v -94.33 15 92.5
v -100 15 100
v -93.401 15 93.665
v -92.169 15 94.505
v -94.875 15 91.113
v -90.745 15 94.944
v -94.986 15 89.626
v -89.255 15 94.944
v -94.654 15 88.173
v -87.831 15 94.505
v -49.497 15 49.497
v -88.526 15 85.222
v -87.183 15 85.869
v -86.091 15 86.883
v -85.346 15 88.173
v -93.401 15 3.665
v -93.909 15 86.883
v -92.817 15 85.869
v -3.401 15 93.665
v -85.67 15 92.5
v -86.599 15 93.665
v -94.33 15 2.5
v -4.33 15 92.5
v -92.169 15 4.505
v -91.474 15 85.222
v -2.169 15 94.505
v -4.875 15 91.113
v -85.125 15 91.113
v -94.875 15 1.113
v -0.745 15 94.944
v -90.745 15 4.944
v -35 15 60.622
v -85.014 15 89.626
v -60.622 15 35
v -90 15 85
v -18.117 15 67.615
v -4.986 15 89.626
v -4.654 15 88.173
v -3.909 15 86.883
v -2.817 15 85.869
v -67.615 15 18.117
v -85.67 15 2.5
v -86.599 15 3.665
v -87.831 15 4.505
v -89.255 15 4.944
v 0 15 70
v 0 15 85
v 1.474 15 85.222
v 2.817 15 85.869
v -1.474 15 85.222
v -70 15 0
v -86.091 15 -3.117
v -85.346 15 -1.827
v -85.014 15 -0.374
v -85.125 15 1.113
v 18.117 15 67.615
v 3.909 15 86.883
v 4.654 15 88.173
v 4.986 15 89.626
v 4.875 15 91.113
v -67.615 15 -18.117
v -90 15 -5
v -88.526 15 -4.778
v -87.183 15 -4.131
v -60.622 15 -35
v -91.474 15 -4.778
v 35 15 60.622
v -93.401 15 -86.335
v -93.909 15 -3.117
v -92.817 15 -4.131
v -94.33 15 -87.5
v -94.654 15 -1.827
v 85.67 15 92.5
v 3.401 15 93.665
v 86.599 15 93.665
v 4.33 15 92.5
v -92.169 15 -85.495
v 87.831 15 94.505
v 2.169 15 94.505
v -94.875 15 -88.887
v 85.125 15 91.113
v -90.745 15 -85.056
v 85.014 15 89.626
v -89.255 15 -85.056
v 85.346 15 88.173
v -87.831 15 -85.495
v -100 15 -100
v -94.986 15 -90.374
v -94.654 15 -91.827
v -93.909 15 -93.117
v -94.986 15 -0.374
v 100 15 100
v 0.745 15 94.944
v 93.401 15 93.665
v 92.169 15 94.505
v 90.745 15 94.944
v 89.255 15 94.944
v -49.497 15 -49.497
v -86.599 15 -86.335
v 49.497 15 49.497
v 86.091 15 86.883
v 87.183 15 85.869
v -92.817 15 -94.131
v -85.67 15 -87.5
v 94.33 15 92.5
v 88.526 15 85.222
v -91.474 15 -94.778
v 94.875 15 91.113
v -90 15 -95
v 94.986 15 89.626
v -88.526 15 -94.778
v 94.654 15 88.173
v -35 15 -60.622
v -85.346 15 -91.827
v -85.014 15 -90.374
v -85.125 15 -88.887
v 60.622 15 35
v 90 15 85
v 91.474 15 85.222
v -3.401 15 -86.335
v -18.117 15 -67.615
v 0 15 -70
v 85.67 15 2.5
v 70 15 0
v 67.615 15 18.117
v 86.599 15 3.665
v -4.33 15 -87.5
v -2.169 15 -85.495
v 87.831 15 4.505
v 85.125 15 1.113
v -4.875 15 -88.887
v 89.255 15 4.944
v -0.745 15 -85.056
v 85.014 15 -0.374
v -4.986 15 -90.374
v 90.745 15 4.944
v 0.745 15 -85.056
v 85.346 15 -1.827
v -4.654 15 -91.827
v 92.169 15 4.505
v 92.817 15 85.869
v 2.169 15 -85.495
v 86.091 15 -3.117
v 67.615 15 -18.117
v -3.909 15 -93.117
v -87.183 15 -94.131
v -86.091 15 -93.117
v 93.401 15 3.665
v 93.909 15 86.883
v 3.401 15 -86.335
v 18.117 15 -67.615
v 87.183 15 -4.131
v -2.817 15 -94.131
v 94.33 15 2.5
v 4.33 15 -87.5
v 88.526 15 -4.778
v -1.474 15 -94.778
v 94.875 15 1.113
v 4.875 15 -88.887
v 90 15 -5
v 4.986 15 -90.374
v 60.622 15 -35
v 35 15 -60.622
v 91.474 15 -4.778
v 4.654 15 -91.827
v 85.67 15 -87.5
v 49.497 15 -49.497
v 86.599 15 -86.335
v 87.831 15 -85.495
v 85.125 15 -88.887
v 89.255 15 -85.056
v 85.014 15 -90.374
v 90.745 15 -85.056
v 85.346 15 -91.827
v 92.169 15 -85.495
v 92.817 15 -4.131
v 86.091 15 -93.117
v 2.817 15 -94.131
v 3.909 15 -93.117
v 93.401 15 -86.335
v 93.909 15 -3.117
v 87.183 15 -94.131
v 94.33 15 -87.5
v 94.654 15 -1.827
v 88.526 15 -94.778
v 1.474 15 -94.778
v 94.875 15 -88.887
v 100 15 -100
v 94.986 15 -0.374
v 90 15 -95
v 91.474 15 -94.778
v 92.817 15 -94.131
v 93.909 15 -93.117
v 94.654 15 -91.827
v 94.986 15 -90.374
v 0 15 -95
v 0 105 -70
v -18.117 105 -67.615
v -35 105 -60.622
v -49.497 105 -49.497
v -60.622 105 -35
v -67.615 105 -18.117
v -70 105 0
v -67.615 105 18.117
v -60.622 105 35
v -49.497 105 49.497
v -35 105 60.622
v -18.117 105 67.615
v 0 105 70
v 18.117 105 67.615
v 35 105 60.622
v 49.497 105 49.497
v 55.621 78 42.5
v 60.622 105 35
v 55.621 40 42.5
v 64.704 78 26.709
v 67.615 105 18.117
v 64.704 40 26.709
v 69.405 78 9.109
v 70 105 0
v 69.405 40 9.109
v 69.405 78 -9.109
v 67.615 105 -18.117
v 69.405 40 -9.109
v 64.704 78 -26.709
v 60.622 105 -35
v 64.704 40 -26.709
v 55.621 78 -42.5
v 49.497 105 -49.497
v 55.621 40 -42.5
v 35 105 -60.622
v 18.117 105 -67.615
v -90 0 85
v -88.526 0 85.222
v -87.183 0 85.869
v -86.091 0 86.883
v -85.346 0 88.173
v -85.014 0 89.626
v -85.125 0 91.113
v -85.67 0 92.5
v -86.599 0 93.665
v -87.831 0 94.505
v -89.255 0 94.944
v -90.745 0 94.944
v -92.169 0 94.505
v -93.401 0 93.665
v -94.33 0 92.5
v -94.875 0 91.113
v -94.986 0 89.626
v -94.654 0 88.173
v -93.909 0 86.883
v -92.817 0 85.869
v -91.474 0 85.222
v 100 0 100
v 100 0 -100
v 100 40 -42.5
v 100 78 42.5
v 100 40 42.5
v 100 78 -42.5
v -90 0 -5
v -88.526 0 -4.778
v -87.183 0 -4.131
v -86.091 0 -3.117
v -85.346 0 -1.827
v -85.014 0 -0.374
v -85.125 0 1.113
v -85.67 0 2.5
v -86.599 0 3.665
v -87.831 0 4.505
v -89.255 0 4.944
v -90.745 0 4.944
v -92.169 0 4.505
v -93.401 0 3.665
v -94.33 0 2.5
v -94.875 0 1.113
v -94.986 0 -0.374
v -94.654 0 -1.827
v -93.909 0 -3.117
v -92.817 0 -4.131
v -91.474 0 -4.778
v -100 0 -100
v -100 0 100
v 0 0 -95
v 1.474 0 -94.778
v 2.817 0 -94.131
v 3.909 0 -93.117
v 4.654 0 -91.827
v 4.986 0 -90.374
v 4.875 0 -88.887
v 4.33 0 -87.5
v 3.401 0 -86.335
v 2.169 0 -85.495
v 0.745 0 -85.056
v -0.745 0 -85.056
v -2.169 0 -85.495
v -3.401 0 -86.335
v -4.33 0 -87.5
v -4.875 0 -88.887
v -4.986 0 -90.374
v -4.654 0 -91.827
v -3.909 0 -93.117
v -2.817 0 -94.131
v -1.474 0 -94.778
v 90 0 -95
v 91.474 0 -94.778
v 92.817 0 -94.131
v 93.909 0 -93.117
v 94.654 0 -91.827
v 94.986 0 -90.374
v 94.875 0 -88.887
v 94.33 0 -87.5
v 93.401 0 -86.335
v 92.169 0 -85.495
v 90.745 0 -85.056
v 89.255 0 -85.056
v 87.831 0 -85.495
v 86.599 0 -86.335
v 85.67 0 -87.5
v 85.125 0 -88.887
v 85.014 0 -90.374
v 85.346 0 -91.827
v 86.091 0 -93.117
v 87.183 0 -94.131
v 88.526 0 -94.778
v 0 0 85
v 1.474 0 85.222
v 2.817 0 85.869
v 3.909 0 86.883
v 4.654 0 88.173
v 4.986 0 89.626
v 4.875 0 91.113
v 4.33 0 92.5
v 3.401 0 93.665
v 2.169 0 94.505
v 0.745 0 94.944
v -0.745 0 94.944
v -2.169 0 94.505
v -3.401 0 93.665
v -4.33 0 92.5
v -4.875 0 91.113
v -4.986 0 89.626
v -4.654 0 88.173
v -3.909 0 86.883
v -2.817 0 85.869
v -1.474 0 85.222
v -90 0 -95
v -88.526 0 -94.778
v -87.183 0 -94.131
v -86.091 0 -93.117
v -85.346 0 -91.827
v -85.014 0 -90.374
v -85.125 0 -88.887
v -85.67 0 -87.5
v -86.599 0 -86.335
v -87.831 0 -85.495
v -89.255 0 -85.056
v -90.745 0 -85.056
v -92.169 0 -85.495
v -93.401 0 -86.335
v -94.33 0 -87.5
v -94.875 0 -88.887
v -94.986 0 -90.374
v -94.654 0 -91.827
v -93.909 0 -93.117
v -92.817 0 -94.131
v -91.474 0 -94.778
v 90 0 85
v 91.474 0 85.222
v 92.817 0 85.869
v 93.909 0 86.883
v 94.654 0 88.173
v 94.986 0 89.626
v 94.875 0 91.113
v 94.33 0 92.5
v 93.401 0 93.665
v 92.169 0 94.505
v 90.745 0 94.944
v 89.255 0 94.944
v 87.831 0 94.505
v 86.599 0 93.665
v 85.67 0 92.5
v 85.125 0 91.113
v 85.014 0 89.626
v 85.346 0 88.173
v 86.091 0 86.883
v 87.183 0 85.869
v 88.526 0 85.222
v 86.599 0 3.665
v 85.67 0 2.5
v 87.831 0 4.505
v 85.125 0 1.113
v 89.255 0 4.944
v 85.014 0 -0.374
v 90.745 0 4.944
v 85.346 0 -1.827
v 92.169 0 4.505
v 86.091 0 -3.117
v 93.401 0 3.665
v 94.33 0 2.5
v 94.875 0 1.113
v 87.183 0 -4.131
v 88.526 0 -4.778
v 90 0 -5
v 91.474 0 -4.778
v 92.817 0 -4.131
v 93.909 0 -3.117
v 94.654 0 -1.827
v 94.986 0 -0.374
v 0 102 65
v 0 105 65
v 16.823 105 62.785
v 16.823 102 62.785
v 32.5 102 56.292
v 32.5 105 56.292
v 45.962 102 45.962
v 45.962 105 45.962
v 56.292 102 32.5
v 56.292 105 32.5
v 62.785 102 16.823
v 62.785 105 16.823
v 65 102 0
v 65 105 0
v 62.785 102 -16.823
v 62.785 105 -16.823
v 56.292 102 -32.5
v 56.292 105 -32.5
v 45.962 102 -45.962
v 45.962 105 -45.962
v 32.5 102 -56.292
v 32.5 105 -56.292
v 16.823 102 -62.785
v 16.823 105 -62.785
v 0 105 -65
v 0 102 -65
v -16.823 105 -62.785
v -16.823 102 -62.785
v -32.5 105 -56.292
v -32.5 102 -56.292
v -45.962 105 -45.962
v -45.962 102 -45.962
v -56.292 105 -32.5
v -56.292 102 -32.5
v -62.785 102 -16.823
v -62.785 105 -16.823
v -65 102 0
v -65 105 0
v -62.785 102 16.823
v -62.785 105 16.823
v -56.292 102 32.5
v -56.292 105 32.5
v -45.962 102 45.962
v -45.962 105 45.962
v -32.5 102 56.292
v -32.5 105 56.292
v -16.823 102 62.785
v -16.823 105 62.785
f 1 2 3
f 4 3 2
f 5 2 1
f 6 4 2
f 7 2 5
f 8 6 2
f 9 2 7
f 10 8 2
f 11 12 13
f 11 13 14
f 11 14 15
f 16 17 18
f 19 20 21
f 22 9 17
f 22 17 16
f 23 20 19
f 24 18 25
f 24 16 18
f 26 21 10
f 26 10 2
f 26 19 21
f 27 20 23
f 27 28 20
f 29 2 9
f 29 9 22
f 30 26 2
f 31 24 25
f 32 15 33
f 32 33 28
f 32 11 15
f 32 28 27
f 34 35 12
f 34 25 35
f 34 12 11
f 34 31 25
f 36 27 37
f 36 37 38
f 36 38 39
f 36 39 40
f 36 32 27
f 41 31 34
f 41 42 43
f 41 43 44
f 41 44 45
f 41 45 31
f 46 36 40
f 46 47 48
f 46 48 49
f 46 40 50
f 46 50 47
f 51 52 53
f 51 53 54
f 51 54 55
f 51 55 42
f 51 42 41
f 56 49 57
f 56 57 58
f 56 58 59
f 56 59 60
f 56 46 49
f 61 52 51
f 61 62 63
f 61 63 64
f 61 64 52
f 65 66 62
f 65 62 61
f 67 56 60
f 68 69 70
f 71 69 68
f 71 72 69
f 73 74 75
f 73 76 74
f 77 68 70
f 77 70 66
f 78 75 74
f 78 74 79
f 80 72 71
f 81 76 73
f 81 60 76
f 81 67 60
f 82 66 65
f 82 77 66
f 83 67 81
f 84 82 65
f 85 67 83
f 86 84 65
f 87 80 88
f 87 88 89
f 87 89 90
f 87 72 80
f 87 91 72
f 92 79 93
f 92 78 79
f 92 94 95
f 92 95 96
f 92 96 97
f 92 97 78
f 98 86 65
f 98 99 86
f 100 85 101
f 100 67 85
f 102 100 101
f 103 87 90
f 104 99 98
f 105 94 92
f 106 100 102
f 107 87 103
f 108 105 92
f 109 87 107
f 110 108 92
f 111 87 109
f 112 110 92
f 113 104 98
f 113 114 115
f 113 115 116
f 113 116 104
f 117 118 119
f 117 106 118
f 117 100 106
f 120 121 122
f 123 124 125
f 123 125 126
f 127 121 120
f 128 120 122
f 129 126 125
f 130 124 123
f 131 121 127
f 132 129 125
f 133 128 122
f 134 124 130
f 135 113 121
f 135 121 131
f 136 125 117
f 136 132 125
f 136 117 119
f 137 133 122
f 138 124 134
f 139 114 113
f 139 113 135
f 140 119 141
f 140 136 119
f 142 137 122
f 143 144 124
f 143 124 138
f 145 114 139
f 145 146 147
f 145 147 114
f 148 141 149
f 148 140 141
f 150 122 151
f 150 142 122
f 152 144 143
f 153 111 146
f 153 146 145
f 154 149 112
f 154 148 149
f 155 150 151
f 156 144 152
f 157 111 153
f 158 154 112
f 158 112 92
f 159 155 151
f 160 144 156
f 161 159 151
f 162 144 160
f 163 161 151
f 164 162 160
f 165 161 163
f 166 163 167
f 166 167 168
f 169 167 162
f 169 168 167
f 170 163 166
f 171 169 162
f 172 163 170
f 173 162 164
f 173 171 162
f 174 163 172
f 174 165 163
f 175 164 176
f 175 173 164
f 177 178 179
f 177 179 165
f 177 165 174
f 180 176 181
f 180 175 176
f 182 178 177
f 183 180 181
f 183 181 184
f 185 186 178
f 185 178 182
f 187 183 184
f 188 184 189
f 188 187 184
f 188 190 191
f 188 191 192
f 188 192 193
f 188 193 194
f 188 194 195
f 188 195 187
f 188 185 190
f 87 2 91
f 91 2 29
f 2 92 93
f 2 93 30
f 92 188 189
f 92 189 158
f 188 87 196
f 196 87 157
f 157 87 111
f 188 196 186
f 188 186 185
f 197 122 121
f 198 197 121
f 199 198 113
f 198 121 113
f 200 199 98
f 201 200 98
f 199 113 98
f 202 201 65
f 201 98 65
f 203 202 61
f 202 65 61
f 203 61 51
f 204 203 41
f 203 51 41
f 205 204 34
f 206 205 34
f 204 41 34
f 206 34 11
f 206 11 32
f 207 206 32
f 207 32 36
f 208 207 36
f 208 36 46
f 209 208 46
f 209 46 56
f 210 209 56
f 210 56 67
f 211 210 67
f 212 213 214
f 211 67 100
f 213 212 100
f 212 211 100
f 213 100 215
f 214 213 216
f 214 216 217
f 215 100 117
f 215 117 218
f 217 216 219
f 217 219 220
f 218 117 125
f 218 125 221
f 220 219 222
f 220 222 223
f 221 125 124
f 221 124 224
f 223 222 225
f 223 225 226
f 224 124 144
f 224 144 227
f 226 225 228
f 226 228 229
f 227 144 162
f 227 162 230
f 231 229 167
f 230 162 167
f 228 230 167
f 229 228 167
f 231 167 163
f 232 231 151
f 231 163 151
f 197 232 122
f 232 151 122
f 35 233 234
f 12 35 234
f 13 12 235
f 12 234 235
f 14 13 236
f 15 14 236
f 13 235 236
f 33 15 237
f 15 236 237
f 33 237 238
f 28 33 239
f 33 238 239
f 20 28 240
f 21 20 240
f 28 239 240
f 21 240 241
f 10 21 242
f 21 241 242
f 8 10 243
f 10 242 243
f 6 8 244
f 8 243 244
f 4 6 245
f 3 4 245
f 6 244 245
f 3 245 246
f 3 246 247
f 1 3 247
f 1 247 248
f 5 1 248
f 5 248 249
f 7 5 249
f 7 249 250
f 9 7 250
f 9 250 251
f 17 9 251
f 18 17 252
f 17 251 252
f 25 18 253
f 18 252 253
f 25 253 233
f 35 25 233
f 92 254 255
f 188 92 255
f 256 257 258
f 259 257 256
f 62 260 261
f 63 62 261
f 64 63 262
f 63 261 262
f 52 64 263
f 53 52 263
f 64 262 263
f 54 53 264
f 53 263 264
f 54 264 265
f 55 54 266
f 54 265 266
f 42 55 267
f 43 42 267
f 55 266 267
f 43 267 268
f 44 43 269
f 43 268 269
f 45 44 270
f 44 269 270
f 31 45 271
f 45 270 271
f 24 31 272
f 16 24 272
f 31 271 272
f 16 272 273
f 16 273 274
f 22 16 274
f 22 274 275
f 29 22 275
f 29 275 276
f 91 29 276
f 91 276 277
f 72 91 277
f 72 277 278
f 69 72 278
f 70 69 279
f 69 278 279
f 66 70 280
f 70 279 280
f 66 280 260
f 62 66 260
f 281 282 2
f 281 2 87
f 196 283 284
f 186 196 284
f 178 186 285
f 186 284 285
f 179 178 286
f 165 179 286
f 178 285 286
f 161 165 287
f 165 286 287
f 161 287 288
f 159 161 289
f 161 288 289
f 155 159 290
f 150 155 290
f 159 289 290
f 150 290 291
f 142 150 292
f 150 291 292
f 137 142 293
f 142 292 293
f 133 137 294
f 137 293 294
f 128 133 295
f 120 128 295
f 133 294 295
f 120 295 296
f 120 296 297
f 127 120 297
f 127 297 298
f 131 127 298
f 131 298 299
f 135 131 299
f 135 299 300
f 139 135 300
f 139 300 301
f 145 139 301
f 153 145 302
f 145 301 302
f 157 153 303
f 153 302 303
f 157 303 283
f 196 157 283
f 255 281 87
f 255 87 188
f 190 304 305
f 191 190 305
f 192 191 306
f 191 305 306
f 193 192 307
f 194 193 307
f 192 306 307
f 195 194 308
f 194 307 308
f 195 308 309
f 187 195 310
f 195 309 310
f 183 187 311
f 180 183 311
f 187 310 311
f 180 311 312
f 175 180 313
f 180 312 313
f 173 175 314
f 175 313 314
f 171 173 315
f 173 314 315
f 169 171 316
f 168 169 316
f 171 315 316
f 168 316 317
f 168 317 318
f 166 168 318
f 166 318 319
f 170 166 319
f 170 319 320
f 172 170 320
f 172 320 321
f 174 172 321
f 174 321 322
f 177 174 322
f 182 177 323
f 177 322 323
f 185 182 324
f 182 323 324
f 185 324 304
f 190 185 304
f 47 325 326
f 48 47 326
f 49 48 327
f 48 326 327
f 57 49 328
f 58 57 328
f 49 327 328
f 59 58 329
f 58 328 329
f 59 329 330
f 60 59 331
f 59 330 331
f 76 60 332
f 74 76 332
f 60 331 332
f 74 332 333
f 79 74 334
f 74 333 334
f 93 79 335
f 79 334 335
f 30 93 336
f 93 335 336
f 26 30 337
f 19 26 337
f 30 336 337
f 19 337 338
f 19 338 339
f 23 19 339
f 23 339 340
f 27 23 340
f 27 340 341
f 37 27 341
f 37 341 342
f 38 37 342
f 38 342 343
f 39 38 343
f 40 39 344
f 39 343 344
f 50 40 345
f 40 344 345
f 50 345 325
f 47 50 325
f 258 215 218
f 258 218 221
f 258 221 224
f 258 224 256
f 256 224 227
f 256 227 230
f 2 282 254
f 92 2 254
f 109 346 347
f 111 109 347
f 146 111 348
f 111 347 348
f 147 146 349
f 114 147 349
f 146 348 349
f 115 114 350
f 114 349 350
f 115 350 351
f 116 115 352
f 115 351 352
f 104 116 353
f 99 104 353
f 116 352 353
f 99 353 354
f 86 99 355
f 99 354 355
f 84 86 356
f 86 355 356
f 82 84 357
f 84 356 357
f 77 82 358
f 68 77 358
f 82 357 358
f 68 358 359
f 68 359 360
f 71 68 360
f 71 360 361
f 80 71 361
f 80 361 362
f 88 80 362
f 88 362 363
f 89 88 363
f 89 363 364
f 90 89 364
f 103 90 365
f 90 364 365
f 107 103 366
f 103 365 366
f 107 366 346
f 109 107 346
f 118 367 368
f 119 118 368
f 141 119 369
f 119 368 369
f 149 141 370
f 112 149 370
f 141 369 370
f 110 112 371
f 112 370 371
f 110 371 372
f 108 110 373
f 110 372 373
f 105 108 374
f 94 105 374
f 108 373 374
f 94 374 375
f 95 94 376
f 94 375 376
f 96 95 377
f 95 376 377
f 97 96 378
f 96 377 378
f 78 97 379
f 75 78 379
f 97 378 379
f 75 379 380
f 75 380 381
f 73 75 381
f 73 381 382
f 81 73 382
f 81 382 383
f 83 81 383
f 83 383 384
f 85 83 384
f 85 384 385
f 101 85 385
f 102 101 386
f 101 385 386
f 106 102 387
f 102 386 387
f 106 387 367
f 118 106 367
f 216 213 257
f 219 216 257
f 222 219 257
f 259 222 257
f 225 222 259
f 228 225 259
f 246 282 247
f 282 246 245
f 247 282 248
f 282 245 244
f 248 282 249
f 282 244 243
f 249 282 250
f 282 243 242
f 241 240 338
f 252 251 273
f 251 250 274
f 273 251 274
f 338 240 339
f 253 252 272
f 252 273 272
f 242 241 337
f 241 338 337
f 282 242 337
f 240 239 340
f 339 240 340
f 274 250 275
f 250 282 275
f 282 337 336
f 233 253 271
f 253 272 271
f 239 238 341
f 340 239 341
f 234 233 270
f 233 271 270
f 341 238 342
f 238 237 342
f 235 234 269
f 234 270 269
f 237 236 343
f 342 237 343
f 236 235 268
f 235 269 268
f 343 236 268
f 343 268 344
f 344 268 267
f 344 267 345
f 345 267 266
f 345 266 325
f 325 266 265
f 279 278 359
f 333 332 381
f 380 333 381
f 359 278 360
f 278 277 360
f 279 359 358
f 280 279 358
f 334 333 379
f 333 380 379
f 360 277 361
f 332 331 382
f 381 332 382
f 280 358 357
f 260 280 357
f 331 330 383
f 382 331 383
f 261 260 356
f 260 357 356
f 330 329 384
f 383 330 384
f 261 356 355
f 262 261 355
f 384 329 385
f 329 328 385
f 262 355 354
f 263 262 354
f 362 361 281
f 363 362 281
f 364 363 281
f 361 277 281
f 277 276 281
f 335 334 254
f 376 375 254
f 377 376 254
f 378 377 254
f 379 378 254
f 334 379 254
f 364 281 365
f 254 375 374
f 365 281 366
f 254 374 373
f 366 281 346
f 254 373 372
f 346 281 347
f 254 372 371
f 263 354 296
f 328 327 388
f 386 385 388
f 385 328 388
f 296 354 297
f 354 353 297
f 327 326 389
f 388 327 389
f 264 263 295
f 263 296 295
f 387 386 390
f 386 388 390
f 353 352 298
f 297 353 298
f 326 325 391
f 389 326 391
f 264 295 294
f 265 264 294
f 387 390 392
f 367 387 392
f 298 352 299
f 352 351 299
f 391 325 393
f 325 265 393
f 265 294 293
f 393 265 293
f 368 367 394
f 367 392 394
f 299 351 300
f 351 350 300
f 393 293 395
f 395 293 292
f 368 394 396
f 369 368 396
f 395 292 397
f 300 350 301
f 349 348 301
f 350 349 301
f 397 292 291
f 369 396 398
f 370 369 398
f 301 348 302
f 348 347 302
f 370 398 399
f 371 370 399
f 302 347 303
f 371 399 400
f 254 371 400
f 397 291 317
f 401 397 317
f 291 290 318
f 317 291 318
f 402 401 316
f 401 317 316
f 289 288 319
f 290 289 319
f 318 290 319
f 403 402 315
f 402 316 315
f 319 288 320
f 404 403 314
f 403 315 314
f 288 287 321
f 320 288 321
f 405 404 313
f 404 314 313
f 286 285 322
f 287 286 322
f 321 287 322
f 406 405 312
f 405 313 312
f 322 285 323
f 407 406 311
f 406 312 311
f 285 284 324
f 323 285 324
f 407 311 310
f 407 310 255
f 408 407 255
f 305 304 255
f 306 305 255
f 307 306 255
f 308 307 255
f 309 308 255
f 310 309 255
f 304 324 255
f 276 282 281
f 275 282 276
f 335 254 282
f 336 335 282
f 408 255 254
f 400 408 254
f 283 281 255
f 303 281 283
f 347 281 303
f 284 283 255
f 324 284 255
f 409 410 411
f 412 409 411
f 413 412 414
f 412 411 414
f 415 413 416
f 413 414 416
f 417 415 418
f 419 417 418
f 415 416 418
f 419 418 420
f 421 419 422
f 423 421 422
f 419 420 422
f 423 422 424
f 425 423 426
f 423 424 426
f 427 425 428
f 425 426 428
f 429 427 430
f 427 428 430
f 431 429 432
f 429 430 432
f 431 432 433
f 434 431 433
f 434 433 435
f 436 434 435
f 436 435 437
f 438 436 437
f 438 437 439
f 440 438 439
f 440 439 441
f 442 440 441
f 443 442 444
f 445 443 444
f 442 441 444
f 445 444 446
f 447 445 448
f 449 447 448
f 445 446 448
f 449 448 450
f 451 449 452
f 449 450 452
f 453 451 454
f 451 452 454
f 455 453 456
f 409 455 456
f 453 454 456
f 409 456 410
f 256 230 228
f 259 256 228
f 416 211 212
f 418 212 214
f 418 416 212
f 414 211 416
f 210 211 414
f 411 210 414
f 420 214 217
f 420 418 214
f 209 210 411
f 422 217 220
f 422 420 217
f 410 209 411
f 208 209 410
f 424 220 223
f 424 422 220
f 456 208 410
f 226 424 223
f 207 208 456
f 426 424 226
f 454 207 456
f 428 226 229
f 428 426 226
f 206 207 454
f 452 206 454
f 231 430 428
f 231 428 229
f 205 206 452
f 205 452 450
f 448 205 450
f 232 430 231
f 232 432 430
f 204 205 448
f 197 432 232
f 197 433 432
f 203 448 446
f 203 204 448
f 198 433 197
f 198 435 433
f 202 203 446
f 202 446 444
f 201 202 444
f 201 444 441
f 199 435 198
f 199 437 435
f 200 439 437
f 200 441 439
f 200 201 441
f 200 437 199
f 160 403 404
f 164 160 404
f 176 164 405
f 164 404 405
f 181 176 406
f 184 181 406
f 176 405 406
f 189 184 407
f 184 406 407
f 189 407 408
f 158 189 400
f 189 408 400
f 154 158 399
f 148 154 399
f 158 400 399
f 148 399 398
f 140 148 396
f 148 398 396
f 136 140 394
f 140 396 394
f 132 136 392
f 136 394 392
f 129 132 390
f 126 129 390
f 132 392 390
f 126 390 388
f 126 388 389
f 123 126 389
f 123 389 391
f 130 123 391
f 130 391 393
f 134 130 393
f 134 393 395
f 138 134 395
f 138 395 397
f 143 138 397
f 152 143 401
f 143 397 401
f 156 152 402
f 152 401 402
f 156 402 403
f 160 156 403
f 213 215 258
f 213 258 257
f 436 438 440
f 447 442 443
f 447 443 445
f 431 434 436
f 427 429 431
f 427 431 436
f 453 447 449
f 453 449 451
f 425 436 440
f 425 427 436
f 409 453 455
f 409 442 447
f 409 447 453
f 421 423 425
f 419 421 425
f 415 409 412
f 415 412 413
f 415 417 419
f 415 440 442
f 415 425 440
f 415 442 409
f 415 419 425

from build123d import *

# Parameters (mm, degrees)
SKETCH1_W           = 200
SKETCH1_H           = 200
BOSS_EXTRUDE1_DEPTH = 15
SKETCH2_R           = 70
BOSS_EXTRUDE2_DEPTH = 90
SKETCH4_R           = 65
CUT_EXTRUDE1_DEPTH  = 3
SKETCH5_W           = 85
SKETCH5_H           = 38
BOSS_EXTRUDE3_DEPTH = 100
SKETCH6_R           = 5
CUT_EXTRUDE2_DEPTH  = 15


with BuildPart() as part:
    # Sketch1 → Boss-Extrude1 (new body)
    with BuildSketch(Plane(origin=(0, 0, 0), x_dir=(1, 0, 0), z_dir=(0, 1, 0))):
        Rectangle(SKETCH1_W, SKETCH1_H)
    extrude(amount=BOSS_EXTRUDE1_DEPTH)

    # Sketch2 → Boss-Extrude2 (add)
    with BuildSketch(Plane(origin=(0, 15, 0), x_dir=(1, 0, 0), z_dir=(0, 1, 0))):
        Circle(SKETCH2_R)
    extrude(amount=BOSS_EXTRUDE2_DEPTH)

    # Sketch4 → Cut-Extrude1 (cut)
    with BuildSketch(Plane(origin=(0, 105, 0), x_dir=(1, 0, 0), z_dir=(0, 1, 0))):
        Circle(SKETCH4_R)
    extrude(amount=-CUT_EXTRUDE1_DEPTH, mode=Mode.SUBTRACT)

    # Sketch5 → Boss-Extrude3 (add)
    with BuildSketch(Plane(origin=(0, 0, 0), x_dir=(0, 0, -1), z_dir=(1, 0, 0))):
        with Locations((0, 59)):
            Rectangle(SKETCH5_W, SKETCH5_H)
    extrude(amount=BOSS_EXTRUDE3_DEPTH)

    # Sketch6 → Cut-Extrude2 (cut)
    with BuildSketch(Plane.XZ):
        with Locations((-90, 90)):
            Circle(SKETCH6_R)
        with Locations((0, 90)):
            Circle(SKETCH6_R)
        with Locations((90, 90)):
            Circle(SKETCH6_R)
        with Locations((90, 0)):
            Circle(SKETCH6_R)
        with Locations((90, -90)):
            Circle(SKETCH6_R)
        with Locations((-90, -90)):
            Circle(SKETCH6_R)
        with Locations((-90, 0)):
            Circle(SKETCH6_R)
        with Locations((0, -90)):
            Circle(SKETCH6_R)
    extrude(amount=-CUT_EXTRUDE2_DEPTH, mode=Mode.SUBTRACT)


solid = part.part
